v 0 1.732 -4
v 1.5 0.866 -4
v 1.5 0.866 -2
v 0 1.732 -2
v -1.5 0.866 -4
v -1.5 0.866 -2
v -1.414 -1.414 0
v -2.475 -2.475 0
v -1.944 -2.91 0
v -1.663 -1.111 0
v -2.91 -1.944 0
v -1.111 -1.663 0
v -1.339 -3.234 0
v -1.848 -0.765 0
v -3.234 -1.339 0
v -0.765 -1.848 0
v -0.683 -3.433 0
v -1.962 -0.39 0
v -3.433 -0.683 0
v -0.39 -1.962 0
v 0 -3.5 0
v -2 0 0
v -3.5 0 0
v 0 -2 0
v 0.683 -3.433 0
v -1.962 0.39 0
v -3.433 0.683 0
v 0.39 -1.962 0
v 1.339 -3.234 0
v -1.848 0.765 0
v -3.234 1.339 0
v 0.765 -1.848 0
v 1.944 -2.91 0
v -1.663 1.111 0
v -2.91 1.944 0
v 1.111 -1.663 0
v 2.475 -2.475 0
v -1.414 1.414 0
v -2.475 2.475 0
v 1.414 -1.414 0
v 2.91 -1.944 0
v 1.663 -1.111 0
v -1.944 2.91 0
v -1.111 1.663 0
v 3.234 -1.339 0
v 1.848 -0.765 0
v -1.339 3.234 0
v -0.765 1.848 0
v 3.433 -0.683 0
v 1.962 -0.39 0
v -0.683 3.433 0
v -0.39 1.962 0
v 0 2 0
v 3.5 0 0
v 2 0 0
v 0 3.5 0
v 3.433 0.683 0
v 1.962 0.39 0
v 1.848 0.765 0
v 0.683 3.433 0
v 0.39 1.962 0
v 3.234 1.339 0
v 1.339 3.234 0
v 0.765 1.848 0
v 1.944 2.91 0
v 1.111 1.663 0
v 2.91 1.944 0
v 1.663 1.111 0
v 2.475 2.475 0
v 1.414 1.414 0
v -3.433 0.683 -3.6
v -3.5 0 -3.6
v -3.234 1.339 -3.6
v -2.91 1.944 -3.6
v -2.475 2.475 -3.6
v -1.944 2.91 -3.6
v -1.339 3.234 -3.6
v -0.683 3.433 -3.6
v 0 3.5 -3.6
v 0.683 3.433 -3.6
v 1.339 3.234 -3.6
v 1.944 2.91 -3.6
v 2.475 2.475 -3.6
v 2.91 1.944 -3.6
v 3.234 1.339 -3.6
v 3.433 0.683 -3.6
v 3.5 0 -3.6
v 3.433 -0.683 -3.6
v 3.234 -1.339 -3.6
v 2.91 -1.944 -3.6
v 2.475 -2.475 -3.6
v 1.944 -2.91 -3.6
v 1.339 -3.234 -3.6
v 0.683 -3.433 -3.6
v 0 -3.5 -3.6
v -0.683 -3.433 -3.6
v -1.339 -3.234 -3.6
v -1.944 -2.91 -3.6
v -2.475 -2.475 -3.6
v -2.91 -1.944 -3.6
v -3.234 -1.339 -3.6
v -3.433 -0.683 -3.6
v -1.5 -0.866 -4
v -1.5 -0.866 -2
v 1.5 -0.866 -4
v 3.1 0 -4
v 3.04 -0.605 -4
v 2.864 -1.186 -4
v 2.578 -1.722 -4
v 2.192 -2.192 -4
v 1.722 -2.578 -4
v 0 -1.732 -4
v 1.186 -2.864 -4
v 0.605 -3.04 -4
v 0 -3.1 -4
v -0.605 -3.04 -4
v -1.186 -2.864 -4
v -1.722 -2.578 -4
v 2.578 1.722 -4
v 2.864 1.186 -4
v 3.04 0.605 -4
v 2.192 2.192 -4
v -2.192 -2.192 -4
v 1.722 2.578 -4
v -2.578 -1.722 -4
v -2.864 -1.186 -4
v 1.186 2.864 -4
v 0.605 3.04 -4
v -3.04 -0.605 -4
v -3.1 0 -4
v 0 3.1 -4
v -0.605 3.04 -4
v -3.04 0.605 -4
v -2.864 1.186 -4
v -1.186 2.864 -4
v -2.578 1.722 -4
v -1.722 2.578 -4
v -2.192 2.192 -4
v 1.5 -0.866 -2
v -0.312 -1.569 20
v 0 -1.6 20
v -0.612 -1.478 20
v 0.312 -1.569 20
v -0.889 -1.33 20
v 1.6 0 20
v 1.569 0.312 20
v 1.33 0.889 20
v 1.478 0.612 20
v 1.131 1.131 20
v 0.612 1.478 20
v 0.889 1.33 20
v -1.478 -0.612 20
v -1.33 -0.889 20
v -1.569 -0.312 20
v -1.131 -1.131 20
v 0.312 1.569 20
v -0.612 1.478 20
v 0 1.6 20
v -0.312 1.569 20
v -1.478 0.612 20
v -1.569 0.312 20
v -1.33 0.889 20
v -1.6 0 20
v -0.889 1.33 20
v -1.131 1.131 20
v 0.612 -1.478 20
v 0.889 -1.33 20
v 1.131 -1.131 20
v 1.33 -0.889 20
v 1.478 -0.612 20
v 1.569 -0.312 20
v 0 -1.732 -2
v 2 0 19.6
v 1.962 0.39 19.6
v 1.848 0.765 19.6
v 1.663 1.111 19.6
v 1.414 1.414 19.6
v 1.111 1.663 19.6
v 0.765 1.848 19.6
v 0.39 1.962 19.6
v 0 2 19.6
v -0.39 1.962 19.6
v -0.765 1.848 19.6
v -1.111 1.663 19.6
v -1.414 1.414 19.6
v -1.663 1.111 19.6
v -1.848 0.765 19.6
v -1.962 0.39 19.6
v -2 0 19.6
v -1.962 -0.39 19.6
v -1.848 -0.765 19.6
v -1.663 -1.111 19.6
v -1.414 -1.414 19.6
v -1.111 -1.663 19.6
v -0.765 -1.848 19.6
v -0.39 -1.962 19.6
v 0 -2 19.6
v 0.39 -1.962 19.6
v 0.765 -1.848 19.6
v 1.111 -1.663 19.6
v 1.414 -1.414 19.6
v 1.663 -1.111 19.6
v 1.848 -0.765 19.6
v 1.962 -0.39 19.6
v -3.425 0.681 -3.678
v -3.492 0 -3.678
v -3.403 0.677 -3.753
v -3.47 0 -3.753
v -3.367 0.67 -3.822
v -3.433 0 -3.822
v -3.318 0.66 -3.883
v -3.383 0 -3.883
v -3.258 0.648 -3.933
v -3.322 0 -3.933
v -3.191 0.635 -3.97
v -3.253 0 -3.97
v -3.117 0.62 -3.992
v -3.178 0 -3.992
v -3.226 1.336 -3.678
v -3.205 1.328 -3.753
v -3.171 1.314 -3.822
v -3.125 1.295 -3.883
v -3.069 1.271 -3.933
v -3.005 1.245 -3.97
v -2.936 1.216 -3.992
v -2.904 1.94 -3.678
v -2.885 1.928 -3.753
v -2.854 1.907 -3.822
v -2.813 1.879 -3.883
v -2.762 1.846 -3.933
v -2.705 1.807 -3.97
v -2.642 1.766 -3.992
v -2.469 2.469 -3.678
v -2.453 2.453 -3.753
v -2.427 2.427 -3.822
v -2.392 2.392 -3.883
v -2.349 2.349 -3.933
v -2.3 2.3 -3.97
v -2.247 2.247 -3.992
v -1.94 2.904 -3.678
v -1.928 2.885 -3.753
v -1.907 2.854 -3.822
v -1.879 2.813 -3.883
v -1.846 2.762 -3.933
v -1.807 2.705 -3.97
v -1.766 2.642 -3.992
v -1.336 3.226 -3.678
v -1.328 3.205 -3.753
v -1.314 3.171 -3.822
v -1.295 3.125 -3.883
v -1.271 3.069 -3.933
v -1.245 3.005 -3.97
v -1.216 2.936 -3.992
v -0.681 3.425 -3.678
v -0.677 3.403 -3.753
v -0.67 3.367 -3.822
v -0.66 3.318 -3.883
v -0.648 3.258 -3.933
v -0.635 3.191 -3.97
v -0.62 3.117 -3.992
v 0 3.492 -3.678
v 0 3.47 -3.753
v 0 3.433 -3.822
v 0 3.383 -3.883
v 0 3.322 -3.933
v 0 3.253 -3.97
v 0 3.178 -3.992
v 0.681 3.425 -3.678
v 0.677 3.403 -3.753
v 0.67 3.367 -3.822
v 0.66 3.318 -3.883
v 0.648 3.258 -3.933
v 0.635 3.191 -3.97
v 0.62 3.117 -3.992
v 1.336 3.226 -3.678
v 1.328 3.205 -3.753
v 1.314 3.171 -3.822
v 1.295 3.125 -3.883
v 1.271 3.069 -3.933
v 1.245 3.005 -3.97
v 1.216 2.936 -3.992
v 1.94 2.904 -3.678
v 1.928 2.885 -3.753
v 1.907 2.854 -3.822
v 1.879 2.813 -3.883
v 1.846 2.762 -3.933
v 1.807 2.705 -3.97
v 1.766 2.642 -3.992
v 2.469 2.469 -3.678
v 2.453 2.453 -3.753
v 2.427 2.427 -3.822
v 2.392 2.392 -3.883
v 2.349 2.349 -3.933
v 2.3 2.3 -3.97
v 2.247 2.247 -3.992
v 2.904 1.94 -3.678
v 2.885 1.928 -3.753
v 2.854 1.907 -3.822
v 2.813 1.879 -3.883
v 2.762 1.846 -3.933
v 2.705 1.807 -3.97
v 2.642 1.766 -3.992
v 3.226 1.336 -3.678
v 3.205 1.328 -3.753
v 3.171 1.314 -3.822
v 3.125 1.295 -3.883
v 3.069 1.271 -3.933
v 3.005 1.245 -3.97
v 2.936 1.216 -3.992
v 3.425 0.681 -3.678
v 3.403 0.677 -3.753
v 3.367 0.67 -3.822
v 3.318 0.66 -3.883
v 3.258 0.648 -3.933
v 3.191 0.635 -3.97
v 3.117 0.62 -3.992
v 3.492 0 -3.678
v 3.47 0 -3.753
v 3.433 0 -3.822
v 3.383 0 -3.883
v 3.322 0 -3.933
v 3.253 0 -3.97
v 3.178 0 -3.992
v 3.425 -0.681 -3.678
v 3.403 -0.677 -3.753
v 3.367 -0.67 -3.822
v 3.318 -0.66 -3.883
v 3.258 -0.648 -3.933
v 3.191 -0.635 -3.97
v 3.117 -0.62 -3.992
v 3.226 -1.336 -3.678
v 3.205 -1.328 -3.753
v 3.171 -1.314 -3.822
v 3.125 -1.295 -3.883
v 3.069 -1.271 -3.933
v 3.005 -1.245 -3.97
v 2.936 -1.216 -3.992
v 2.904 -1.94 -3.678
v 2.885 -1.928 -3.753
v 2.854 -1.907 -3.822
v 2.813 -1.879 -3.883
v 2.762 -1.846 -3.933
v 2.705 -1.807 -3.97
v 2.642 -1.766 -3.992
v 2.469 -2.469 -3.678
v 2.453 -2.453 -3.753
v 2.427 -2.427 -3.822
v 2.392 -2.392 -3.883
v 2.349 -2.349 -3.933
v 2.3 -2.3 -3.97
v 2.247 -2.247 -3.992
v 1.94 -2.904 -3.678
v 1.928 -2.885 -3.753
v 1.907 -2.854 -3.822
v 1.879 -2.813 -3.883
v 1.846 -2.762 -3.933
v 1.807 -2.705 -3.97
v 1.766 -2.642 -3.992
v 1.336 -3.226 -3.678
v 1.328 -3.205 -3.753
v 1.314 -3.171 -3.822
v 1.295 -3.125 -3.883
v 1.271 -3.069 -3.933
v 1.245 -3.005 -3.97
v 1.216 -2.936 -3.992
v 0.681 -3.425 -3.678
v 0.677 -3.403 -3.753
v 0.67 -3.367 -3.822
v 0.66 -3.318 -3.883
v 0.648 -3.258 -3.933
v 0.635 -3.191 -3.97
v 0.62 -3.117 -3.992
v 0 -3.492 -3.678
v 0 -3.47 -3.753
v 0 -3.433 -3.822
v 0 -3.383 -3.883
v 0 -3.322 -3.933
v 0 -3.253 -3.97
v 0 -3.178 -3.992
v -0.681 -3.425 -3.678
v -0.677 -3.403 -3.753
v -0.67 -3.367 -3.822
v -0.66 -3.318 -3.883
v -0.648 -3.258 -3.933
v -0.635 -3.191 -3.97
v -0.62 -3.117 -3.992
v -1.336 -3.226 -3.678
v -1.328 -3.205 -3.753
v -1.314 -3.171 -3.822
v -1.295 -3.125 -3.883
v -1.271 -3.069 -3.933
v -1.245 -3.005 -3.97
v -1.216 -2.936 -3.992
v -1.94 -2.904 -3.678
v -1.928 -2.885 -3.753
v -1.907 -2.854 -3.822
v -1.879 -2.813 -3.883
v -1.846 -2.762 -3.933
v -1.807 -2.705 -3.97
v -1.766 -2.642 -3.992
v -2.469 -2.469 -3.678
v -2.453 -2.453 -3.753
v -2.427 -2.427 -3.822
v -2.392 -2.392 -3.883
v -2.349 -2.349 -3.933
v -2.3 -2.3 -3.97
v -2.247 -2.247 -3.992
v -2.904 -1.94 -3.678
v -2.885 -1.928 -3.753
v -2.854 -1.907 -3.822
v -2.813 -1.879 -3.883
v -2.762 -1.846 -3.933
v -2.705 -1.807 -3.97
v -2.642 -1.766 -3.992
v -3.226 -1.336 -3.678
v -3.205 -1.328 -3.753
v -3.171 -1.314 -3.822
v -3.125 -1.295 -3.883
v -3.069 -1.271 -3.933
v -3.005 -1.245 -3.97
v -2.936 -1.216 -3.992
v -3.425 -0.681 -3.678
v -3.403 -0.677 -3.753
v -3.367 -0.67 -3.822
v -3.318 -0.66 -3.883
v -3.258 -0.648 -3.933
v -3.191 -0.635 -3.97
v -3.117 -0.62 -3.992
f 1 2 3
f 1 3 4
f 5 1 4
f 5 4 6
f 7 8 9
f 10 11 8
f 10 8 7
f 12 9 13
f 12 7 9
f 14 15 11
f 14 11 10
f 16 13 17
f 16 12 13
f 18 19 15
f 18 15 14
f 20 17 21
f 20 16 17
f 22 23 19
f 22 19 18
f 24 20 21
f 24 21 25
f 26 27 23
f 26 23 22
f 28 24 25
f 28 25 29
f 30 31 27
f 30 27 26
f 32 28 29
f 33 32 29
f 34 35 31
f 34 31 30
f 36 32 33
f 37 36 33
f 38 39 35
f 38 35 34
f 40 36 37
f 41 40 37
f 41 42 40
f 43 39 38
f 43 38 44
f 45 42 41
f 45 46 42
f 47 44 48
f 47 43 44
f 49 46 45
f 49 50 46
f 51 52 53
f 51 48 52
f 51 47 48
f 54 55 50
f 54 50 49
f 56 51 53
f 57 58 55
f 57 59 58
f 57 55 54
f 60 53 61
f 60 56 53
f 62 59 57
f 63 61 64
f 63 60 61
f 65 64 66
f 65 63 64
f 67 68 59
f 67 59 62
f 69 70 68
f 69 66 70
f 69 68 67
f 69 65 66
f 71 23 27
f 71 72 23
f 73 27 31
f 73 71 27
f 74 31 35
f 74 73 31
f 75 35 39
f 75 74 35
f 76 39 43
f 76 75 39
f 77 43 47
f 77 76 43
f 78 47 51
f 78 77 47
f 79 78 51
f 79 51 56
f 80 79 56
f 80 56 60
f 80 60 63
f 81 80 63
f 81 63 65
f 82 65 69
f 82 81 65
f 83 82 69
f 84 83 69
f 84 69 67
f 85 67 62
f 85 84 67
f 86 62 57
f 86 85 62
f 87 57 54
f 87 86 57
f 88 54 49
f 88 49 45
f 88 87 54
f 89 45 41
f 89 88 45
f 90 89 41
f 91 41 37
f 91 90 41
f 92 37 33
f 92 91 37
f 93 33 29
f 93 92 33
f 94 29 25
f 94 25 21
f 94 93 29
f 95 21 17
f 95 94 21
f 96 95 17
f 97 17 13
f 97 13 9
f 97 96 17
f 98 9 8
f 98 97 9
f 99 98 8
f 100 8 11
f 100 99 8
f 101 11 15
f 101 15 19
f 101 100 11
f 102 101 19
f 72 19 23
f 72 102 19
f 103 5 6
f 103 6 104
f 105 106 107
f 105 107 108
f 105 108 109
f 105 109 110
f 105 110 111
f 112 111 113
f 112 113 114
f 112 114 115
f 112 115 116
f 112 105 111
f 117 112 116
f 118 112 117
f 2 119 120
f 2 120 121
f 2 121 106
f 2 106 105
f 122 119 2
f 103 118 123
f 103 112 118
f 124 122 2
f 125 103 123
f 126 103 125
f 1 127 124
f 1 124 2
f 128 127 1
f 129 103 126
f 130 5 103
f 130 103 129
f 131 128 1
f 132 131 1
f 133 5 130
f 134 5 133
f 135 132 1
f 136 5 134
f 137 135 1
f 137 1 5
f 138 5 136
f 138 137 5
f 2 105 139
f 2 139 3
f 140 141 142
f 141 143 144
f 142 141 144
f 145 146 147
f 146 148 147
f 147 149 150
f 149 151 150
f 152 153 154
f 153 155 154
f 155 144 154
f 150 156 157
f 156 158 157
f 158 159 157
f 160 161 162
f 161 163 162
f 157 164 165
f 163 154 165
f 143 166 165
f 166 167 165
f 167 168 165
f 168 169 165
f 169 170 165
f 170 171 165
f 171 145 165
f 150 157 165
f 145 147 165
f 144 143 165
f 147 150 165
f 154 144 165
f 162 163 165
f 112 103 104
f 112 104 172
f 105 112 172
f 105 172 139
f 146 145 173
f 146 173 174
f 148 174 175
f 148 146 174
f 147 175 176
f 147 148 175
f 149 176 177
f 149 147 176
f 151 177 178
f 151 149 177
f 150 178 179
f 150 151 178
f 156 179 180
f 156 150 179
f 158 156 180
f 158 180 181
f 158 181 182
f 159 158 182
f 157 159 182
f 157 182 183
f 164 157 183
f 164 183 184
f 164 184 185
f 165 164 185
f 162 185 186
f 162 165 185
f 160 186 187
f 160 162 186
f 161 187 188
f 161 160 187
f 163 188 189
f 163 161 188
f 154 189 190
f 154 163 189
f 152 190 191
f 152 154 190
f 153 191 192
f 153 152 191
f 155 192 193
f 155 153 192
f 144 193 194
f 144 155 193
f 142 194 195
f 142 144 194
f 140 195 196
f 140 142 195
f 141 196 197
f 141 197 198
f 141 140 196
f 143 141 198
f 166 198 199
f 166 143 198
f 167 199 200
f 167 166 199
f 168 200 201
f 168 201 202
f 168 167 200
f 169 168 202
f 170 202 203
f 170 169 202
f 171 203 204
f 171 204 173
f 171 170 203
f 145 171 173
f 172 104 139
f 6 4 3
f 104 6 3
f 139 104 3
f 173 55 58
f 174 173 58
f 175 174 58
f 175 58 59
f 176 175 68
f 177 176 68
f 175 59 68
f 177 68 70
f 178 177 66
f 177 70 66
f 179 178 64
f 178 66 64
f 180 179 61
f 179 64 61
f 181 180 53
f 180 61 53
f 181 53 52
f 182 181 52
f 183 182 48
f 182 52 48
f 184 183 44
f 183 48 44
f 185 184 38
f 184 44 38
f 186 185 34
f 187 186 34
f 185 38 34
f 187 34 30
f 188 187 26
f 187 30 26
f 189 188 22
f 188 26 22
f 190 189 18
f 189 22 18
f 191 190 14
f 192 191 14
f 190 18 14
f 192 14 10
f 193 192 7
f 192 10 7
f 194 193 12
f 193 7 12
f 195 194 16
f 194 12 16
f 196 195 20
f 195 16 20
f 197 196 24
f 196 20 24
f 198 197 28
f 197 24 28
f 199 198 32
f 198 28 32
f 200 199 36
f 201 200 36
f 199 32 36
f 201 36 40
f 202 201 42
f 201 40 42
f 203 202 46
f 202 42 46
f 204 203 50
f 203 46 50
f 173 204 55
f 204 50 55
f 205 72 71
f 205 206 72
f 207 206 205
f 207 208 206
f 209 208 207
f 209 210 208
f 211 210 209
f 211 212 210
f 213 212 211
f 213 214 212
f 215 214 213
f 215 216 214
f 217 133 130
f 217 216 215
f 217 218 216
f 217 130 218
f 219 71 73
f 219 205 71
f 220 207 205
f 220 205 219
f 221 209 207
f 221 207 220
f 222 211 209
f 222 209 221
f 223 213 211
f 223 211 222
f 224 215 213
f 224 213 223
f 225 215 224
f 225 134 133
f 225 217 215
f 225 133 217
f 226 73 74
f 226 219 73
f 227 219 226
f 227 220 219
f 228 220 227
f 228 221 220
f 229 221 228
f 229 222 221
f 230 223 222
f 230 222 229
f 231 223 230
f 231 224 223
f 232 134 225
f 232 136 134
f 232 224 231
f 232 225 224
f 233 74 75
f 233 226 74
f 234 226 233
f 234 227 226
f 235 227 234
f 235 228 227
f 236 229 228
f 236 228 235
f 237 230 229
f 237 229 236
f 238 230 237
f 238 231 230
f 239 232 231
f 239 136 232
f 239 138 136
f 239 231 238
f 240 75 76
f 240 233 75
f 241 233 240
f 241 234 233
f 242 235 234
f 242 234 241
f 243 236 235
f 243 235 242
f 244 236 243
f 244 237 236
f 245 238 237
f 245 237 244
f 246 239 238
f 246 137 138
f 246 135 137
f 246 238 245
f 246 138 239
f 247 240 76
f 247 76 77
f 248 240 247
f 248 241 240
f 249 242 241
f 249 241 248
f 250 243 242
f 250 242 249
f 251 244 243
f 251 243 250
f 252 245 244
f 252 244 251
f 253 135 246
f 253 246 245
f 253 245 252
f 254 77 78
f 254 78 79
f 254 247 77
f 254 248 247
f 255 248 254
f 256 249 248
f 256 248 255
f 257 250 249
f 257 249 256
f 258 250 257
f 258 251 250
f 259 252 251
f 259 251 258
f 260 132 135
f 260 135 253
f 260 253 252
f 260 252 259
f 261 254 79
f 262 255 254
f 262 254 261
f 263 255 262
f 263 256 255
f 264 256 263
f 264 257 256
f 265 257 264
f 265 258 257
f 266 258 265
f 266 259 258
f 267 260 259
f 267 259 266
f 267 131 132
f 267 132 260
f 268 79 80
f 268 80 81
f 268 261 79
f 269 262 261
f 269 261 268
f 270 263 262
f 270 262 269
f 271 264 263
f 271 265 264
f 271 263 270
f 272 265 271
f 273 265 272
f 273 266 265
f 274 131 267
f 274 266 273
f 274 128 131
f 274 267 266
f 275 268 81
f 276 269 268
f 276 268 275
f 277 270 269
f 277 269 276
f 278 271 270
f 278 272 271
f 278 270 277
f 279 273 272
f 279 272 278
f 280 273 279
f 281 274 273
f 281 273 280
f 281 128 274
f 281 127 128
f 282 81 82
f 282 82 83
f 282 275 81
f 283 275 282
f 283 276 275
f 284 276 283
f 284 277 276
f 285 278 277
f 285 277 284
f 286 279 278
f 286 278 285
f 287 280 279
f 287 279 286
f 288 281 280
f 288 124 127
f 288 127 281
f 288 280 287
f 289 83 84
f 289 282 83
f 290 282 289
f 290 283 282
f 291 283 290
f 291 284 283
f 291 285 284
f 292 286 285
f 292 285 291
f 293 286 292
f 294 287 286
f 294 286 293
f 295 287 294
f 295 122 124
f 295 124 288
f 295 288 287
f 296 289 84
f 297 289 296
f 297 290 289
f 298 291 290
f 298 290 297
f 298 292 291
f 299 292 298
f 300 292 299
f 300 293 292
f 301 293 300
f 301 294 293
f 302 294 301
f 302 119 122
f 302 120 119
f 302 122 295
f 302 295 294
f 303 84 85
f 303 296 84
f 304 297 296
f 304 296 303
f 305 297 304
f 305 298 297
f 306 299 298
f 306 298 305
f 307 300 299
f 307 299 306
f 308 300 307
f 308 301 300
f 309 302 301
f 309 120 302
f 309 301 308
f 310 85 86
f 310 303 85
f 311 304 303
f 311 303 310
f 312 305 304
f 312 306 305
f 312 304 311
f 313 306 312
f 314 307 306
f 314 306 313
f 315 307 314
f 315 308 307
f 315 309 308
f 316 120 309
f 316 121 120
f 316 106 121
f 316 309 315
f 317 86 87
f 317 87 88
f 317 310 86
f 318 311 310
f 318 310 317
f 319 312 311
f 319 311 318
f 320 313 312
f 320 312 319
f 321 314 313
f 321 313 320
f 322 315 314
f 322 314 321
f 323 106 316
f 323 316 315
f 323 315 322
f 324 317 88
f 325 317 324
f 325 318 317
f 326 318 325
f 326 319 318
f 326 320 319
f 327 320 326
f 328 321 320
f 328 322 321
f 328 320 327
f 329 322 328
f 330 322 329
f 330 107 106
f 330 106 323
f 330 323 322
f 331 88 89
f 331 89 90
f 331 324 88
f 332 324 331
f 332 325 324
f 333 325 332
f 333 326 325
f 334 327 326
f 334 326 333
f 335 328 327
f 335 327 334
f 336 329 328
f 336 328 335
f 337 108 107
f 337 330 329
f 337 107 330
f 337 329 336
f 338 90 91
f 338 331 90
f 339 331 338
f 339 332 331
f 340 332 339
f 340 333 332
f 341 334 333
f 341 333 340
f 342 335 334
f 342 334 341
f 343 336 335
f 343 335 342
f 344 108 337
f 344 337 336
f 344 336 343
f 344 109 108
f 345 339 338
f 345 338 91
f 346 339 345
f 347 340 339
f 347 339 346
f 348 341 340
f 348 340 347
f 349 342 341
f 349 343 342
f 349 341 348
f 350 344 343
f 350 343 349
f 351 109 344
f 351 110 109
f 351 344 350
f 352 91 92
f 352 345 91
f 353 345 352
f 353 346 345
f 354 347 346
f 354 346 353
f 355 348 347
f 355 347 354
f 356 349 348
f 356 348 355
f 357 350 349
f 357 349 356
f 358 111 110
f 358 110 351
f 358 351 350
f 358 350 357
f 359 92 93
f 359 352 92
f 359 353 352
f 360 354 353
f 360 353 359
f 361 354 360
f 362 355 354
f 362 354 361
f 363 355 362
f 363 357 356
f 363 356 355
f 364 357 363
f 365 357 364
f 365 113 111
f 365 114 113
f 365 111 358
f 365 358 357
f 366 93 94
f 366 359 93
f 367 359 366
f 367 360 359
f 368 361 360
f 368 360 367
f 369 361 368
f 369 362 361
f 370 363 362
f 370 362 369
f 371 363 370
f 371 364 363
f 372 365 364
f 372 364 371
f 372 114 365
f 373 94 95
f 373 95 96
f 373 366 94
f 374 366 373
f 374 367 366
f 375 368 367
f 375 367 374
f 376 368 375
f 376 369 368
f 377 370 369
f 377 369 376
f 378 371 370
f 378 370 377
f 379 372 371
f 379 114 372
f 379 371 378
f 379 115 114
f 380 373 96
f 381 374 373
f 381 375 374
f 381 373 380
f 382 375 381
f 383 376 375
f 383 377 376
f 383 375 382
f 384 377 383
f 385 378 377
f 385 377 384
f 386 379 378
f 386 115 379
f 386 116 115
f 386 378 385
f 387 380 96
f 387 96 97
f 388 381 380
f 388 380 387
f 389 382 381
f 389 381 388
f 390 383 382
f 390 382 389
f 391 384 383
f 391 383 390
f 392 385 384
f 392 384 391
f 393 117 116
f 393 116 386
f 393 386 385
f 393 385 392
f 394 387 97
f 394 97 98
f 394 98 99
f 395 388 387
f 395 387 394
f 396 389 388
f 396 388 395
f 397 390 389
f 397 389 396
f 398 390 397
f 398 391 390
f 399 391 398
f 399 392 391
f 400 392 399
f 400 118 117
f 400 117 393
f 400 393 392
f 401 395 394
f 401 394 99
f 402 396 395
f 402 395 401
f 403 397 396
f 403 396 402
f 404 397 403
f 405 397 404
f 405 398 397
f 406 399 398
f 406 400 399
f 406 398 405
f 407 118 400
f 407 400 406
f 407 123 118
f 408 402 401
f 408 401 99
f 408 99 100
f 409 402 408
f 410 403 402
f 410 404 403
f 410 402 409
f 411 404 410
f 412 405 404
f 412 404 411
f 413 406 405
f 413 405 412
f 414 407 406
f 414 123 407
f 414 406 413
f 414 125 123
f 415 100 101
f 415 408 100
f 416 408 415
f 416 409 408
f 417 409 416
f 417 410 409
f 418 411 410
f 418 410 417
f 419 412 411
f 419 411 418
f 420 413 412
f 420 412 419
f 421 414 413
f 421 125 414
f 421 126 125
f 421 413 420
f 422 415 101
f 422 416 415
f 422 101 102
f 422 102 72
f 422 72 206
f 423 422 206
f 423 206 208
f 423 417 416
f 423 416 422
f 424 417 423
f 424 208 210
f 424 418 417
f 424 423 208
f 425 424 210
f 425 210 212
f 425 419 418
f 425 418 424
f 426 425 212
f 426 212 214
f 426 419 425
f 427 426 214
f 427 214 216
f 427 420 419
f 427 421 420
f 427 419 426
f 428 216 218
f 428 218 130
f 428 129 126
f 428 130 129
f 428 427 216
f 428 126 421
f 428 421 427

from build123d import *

# Parameters (mm, degrees)
ENLEV_MAT_EXTRU1_DEPTH = 2
ESQUISSE3_W            = 2
ESQUISSE3_H            = 20
CHANFREIN1_SIZE        = 0.4


with BuildPart() as part:
    # Esquisse1 → Base-Révolution (revolve)
    with BuildSketch(Plane(origin=(0, 0, 0), x_dir=(1, 0, 0), z_dir=(0, 1, 0)), mode=Mode.PRIVATE) as base_r_volution_sk:
        with BuildLine():
            Line((0, 0), (3.5, 0))
            Line((3.5, 0), (3.5, 3.6))
            ThreePointArc((3.5, 3.6), (3.382842712, 3.882842712), (3.1, 4))
            Line((3.1, 4), (0, 4))
            Line((0, 4), (0, 0))
        make_face()
    revolve(base_r_volution_sk.sketch.rotate(Axis((0, 0, 0), (0, 0, -1)), 180), axis=Axis((0, 0, 0), (0, 0, -1)))

    # Esquisse2 → enlev-mat-Extru1 (cut)
    with BuildSketch(Plane.XY.offset(-4)):
        Polygon((1.5, -0.866025404), (1.5, 0.866025404), (0, 1.732050808), (-1.5, 0.866025404), (-1.5, -0.866025404), (0, -1.732050808), align=None)
    extrude(amount=ENLEV_MAT_EXTRU1_DEPTH, mode=Mode.SUBTRACT)

    # Esquisse3 → Boss.-Révol.1 (revolve)
    with BuildSketch(Plane(origin=(0, 0, 0), x_dir=(1, 0, 0), z_dir=(0, 1, 0))):
        with Locations((1, -10)):
            Rectangle(ESQUISSE3_W, ESQUISSE3_H)
    revolve(axis=Axis((0, 0, 0), (0, 0, 1)))

    # Chanfrein1
    chanfrein1_edges = [part.edges().sort_by_distance(p)[0] for p in [
        (-2, 0, 20),
    ]]
    chamfer(chanfrein1_edges, length=CHANFREIN1_SIZE)


solid = part.part
